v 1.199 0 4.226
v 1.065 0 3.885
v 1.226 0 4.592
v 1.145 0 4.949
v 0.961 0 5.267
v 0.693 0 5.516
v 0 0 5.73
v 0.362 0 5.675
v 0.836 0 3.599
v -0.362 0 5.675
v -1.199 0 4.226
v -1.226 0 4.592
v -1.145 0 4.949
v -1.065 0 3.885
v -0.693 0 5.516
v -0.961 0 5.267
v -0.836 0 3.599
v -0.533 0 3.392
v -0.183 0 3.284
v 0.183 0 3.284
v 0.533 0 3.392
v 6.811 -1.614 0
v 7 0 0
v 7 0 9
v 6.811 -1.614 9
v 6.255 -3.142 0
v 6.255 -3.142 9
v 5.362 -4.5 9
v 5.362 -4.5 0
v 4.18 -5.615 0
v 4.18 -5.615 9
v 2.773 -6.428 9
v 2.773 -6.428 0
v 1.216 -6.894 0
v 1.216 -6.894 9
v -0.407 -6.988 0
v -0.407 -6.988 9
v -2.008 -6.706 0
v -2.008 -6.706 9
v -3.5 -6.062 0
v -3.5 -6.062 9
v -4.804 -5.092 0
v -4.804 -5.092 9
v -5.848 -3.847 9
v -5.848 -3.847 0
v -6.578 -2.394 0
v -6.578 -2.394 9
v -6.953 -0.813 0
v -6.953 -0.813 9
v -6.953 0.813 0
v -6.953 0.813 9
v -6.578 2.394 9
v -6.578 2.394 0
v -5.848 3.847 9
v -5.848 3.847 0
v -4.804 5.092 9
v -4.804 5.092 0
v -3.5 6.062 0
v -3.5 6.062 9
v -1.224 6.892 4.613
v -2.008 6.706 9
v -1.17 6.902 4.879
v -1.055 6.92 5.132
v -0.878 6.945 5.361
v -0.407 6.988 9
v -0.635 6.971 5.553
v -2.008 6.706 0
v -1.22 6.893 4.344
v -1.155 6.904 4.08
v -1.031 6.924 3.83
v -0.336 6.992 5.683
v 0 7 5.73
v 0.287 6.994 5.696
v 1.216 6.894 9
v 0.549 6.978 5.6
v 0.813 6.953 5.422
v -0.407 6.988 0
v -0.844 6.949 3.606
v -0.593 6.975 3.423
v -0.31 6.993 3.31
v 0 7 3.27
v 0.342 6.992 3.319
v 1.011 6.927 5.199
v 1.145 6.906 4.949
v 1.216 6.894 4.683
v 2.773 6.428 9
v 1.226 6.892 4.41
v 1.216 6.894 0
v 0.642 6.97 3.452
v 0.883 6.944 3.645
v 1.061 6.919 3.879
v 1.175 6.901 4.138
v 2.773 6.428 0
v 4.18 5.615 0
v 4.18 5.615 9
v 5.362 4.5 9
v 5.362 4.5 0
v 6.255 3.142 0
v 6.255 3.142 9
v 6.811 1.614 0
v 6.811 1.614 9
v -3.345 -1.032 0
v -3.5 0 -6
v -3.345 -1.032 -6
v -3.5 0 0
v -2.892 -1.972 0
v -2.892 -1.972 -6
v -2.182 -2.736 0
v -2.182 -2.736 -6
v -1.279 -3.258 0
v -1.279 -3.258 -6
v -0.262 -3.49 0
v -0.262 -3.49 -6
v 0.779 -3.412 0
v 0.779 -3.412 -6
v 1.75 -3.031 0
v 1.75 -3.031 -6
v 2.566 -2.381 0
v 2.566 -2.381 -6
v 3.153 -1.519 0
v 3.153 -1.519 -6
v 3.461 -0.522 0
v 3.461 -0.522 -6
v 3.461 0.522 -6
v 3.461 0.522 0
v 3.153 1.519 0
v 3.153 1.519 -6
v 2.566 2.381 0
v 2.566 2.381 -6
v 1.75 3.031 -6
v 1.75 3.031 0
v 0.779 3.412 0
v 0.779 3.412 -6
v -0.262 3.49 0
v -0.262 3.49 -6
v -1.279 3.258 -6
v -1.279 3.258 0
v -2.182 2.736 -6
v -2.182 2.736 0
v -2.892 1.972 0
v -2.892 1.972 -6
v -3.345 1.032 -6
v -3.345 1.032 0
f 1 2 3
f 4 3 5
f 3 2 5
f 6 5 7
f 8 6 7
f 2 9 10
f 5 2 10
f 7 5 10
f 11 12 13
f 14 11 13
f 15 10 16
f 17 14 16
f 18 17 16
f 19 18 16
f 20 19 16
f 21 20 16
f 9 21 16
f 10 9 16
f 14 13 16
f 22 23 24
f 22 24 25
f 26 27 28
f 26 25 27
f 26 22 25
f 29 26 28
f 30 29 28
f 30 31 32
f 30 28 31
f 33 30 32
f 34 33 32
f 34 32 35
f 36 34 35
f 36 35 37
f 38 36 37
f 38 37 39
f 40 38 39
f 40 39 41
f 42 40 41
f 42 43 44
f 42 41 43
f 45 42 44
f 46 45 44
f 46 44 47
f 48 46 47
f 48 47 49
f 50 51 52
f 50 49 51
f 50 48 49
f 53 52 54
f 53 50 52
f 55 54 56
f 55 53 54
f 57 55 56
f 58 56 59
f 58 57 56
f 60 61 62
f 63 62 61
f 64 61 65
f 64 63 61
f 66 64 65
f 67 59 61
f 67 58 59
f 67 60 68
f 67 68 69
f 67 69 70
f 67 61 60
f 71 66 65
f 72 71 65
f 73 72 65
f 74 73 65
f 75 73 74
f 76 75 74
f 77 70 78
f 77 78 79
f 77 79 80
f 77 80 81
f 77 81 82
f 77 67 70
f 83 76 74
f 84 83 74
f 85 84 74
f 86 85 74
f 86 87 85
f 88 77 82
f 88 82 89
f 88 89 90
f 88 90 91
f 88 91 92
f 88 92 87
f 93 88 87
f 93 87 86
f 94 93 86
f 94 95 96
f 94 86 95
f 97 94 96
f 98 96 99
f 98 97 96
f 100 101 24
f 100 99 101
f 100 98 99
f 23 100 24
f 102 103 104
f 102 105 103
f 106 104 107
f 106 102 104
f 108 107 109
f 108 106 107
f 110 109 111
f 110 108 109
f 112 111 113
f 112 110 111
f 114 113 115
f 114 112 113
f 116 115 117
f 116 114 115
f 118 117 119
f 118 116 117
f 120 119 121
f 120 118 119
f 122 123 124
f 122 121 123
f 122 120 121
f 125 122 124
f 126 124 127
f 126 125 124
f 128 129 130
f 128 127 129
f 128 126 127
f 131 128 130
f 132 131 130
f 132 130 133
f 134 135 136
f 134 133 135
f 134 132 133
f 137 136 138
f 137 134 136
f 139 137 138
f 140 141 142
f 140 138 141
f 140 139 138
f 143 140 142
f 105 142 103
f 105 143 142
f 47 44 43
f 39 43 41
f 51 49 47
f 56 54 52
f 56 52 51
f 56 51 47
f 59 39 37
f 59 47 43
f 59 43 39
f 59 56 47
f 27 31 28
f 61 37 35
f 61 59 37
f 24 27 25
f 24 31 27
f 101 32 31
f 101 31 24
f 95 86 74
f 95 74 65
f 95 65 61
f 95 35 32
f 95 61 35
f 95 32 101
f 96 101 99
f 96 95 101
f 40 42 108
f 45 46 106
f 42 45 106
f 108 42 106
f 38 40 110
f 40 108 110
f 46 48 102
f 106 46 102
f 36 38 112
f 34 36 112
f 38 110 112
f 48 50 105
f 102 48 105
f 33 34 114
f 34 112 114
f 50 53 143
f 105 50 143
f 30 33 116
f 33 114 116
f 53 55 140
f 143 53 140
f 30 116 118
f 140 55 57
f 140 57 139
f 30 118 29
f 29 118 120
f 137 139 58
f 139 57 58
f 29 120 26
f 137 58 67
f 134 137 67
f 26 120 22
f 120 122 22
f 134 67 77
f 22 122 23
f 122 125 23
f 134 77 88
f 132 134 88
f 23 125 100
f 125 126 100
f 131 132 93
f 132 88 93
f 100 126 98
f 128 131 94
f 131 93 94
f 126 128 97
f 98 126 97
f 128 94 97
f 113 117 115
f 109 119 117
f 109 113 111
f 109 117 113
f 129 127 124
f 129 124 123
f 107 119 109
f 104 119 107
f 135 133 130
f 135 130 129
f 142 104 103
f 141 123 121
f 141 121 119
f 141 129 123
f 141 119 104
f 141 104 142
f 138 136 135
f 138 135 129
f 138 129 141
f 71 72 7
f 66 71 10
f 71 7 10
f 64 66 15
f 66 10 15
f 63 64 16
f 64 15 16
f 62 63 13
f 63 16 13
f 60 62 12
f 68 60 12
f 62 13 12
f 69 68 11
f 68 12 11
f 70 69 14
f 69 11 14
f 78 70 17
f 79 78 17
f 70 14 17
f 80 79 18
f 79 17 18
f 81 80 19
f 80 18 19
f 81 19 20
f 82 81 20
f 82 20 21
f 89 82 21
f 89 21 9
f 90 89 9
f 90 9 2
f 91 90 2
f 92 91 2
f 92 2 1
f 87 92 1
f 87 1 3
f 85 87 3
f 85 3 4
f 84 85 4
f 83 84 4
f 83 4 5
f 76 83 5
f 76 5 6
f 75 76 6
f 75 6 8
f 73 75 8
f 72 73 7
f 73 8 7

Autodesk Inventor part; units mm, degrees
ref_plane "YZ Plane" through (0, 0, 0) normal (1, 0, 0) x (0, 1, 0)
ref_plane "XZ Plane" through (0, 0, 0) normal (0, 1, 0) x (-1, 0, 0)
sketch "Sketch1" plane through (0, 0, 0) normal (0, 0, 1) x (1, 0, 0)
  circle A0 centre (0, 0) radius 7
  dimension "d0" = 14
extrude "Extrusion1" add sketch "Sketch1" along normal blind 9
ref_plane "Work Plane1" through (-7, 7, 9) normal (0, 1, 0) x (1, 0, 0)
sketch "Sketch3" plane through (-7, 7, 9) normal (0, 1, 0) x (1, 0, 0)
  circle A0 centre (7, 4.5) radius 1.2
  dimension "d9" = 2.4
hole "Hole1" at (0, 7, 4.5) direction (0, -1, 0) diameter 2.459 depth 7 thread size "M3x0.5" designation "M3" class "6H" standard "GB Metric profile"
sketch "Sketch4" plane through (0, 0, 0) normal (0, 0, -1) x (-1, 0, 0)
  circle A0 centre (0, 0) radius 7 projected
  circle A1 centre (0, 0) radius 3.5
  dimension "d17" = 7
extrude "Extrusion3" add sketch "Sketch4" along normal blind 6 contours A1
properties part number "gear hridel"
